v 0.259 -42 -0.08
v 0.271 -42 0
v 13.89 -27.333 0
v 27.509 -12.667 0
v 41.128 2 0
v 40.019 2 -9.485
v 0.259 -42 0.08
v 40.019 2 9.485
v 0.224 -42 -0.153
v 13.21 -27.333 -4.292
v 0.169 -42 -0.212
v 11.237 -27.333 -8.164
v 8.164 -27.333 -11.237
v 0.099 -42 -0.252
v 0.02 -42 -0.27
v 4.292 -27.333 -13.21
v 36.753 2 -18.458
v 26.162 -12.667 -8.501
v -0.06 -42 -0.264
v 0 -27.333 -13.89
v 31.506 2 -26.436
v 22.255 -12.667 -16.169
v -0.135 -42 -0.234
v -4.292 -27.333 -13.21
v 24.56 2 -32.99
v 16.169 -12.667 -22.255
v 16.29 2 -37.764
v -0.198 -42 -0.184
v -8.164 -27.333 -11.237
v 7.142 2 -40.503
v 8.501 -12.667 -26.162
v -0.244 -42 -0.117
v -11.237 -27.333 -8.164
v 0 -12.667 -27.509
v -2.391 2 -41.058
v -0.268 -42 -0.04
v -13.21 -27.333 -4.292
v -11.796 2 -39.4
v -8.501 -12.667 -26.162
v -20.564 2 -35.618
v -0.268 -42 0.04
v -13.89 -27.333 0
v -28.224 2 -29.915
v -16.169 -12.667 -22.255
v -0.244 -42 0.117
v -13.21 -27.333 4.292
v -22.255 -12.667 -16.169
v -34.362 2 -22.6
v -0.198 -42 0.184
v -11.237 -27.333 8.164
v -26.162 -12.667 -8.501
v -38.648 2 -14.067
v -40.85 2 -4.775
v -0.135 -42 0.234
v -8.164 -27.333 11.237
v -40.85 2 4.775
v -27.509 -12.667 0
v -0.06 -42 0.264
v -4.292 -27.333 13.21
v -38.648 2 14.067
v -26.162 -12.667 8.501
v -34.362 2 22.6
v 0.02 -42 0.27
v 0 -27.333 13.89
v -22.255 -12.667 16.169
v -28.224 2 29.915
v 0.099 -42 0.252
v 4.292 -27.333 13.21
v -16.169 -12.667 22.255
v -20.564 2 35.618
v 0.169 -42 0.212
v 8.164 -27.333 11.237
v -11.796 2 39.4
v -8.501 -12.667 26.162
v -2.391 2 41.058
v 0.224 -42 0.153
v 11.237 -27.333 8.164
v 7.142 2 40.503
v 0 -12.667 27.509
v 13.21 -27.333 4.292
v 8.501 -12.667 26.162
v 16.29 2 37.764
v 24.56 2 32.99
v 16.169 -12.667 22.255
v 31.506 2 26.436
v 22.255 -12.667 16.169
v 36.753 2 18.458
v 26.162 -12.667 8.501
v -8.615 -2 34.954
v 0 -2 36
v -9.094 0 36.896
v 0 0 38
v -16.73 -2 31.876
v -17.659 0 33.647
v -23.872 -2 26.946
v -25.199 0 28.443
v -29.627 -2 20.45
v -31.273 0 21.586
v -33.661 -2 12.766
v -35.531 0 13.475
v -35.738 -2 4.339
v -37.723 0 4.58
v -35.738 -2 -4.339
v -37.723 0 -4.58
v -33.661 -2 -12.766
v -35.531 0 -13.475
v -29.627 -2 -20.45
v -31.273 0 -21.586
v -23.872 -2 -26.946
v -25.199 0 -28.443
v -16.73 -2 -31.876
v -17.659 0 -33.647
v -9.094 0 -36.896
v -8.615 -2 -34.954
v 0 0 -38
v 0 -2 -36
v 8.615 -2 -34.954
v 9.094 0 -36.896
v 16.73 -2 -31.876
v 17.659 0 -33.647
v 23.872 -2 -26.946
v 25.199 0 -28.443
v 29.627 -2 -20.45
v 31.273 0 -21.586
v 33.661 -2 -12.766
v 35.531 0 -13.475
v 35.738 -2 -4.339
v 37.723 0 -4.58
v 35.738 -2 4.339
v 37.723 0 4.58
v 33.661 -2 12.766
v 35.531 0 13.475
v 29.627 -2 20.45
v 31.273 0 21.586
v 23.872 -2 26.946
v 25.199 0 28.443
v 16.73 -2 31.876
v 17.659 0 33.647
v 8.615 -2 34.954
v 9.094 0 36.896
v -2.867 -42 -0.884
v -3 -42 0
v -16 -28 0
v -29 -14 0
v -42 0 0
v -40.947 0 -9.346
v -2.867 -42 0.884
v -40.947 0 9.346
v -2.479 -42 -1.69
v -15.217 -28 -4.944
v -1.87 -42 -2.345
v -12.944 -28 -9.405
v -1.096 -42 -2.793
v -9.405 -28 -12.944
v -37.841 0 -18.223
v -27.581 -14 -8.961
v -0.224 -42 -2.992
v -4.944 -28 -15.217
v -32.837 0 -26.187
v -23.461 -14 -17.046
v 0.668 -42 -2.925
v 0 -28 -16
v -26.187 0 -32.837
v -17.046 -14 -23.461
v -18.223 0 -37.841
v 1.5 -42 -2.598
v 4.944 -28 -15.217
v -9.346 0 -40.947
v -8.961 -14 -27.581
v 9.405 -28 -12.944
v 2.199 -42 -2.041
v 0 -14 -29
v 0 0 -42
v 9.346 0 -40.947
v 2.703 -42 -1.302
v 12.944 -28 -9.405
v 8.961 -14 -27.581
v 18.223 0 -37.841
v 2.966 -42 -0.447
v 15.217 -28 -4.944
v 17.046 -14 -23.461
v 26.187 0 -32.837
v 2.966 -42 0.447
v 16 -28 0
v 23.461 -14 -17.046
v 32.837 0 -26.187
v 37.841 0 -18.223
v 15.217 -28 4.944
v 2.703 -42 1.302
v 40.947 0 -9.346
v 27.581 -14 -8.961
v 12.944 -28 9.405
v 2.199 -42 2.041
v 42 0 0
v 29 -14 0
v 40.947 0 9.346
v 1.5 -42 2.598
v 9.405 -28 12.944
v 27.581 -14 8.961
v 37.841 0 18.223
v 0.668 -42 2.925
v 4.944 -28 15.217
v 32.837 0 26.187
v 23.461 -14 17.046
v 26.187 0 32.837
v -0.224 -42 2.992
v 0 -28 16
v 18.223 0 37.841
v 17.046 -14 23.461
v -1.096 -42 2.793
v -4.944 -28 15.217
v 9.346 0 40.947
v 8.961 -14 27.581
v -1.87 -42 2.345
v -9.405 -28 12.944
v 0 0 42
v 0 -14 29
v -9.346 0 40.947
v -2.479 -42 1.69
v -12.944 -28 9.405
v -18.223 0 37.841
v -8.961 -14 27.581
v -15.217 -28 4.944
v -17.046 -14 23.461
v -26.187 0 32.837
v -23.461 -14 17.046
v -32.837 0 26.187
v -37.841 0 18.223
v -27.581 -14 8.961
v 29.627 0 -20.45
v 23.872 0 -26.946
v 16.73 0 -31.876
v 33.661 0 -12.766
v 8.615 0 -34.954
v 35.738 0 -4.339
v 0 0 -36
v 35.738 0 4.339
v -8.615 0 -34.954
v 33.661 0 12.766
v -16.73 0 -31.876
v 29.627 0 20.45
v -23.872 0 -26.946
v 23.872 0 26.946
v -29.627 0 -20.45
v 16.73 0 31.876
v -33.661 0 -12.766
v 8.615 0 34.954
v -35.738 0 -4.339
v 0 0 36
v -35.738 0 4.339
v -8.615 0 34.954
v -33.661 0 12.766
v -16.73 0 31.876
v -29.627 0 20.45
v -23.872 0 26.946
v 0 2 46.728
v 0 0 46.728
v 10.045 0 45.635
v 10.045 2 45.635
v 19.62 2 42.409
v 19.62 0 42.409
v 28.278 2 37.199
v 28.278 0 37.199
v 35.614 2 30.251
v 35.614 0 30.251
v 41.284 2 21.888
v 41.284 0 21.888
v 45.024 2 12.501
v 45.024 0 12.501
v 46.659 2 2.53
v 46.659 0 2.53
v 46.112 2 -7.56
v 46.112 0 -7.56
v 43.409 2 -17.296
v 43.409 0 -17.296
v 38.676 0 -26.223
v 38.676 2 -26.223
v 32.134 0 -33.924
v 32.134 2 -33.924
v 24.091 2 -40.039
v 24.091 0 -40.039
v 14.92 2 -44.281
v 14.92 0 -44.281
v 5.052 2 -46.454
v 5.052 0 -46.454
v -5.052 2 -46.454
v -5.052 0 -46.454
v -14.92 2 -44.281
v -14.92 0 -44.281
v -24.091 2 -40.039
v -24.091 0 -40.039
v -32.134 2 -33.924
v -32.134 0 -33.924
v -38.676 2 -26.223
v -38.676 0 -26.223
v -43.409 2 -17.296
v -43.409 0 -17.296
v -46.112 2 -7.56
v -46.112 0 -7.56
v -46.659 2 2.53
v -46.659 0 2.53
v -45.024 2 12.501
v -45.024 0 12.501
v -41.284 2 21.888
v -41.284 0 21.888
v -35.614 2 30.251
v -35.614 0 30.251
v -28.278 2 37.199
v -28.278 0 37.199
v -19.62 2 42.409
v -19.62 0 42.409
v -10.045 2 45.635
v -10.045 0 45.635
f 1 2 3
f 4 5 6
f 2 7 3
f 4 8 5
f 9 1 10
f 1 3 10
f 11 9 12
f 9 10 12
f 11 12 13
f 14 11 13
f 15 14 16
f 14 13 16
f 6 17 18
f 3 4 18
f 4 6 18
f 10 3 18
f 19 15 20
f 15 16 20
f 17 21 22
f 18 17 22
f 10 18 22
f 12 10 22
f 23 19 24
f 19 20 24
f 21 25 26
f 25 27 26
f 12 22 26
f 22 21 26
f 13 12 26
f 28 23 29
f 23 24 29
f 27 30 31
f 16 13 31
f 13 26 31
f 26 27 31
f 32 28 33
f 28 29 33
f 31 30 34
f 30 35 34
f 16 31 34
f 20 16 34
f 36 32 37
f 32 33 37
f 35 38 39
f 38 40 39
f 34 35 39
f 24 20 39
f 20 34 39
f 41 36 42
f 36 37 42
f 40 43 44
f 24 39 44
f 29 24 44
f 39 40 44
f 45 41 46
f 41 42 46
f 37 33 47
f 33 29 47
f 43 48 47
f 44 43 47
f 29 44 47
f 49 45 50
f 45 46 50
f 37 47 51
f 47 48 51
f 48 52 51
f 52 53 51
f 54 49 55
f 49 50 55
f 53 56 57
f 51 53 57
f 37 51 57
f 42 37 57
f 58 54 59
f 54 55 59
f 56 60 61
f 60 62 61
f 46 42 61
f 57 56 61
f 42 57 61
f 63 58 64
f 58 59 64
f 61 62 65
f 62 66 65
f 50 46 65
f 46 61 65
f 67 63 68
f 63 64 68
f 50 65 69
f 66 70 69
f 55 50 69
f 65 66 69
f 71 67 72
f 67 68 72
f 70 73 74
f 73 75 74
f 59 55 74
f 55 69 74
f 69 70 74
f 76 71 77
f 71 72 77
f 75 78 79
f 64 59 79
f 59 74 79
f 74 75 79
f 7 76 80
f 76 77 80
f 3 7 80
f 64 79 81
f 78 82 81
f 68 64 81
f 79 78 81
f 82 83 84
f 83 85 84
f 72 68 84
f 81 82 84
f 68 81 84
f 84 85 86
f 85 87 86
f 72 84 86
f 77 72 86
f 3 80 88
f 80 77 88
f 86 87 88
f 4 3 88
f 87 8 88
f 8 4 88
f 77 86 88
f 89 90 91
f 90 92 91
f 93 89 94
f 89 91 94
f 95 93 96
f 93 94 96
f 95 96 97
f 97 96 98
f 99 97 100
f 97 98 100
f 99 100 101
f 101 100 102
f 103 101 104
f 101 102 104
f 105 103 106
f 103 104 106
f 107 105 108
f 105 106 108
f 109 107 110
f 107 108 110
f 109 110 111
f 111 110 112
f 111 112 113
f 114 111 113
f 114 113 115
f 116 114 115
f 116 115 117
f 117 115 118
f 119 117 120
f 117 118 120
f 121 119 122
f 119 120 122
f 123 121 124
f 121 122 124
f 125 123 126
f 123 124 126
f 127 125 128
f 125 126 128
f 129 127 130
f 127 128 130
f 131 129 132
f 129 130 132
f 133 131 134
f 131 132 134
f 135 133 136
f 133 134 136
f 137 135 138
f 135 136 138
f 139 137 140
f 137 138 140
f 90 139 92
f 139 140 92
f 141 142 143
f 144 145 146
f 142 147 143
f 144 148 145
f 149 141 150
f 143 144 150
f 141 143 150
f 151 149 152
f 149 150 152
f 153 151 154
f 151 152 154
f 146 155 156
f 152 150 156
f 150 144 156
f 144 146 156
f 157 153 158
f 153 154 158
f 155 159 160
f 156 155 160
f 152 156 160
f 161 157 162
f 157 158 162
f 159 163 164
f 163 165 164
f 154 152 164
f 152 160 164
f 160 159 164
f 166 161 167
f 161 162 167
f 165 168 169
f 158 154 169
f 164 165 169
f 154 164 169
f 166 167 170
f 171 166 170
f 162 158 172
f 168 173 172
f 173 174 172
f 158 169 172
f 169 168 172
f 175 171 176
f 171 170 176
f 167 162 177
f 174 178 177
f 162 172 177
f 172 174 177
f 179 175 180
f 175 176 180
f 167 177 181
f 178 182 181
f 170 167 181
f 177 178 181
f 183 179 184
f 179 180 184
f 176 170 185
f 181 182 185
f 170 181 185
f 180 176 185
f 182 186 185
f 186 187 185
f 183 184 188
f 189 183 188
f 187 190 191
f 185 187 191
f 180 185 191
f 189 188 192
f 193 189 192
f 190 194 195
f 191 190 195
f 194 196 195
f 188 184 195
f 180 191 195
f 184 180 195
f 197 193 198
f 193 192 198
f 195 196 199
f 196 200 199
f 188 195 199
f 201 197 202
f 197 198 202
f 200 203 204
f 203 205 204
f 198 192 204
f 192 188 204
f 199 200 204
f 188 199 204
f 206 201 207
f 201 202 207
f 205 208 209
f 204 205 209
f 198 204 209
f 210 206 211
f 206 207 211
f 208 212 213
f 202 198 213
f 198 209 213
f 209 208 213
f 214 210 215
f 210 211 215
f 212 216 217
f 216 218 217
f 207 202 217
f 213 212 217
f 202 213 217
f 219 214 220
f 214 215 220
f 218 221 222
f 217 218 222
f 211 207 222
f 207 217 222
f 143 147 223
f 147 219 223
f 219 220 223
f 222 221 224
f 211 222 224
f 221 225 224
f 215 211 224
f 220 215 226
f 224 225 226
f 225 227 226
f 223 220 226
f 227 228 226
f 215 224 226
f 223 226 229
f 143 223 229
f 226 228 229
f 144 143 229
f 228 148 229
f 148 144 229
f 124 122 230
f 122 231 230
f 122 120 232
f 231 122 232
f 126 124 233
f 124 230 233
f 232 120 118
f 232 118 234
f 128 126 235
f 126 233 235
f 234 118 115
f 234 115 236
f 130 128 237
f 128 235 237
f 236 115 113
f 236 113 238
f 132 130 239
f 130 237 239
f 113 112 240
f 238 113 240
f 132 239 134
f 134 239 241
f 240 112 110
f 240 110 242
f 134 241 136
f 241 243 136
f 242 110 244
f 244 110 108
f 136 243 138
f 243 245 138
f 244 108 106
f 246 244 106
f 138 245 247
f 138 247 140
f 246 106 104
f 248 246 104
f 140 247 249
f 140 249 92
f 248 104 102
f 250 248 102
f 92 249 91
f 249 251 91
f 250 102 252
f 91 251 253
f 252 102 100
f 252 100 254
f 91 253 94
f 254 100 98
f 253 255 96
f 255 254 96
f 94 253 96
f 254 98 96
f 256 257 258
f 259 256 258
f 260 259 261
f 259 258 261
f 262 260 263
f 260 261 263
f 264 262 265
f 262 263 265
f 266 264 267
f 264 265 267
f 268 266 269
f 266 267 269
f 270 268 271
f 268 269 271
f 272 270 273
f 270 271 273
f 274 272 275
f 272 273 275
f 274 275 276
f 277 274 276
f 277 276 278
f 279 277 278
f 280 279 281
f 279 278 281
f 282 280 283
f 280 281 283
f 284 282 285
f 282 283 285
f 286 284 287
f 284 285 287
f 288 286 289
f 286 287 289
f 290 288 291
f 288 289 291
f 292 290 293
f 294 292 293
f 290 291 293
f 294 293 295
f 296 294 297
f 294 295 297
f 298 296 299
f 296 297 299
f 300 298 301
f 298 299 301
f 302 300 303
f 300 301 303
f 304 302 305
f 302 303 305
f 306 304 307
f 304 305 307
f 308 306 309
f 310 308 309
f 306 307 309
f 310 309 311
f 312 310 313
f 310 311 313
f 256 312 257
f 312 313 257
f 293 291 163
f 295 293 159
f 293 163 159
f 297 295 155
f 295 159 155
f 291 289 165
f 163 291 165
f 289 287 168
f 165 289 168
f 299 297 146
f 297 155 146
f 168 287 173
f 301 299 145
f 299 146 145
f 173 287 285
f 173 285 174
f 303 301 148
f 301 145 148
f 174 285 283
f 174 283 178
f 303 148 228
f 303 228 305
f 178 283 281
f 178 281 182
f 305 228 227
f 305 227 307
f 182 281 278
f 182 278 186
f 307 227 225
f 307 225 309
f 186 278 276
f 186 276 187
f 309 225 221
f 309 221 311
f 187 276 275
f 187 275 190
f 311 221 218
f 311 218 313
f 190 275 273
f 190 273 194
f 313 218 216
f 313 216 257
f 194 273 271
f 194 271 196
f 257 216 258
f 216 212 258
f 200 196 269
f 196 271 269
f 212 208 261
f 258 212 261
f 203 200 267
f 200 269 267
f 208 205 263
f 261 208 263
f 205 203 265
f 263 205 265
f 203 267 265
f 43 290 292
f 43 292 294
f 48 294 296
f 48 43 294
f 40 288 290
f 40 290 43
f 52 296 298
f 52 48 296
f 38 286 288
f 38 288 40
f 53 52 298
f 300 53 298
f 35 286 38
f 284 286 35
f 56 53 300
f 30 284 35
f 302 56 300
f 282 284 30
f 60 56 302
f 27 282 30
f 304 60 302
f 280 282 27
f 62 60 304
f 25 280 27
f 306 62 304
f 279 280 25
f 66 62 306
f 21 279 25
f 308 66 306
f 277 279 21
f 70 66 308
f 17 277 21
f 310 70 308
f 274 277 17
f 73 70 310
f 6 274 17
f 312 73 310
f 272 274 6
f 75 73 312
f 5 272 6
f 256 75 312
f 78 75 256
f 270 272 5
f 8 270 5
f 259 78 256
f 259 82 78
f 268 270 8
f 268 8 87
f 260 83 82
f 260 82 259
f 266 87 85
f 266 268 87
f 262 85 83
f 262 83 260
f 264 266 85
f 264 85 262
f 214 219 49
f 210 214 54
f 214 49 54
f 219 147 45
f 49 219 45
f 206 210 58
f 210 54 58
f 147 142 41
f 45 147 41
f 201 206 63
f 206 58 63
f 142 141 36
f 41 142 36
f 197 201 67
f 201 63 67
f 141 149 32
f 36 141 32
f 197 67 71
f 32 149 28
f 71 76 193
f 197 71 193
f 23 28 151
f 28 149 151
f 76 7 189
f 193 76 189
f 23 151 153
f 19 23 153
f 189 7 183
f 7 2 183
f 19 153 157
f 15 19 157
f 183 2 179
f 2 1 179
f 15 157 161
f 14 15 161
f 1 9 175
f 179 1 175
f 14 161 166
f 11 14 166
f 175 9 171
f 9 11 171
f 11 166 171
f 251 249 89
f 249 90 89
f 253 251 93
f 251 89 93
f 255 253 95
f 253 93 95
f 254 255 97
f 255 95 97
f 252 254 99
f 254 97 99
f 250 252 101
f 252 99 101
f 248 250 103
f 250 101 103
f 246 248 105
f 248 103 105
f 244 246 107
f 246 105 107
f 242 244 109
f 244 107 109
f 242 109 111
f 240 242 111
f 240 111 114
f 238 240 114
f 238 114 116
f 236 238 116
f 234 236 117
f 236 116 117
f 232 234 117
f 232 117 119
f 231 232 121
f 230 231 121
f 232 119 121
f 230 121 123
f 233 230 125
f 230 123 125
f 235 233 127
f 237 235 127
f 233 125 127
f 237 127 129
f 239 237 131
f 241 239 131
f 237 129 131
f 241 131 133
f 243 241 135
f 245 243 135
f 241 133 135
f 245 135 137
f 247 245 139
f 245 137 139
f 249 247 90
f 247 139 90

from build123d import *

# Parameters (mm, degrees)
SKETCH1_R           = 46.7275
BOSS_EXTRUDE2_DEPTH = 2


# Read off the part's stored shape, not the designer's step: Shell1
with BuildPart() as part:
    # Sketch2 → Revolve1 (revolve)
    with BuildSketch(Plane.XY):
        Polygon((0, 0), (0, -42), (-3, -42), (-42, 0), align=None)
    revolve(axis=Axis((0, 0, 0), (0, -1, 0)))

    # Sketch1 → Boss-Extrude2 (add)
    with BuildSketch(Plane(origin=(0, 0, 0), x_dir=(1, 0, 0), z_dir=(0, 1, 0))):
        with Locations(Location((0, 0, 0), (0, 0, 270))):
            Circle(SKETCH1_R)
    extrude(amount=BOSS_EXTRUDE2_DEPTH)

    # Shell1 outline → Shell1 (revolve, cut)
    with BuildSketch(Plane.XY):
        Polygon((41.127860975, 2), (0, 2), (0, -42), (0.270718118, -42), align=None)
    revolve(axis=Axis((0, 0, 0), (0, 1, 0)), mode=Mode.SUBTRACT)


with BuildPart() as body_2:
    # Sketch3 → Revolve2 (revolve)
    with BuildSketch(Plane(origin=(0, 0, 0), x_dir=(0, 0, -1), z_dir=(1, 0, 0))):
        Polygon((-38, 0), (-36, 0), (-36, -2), align=None)
    revolve(axis=Axis((0, 0, 0), (0, -1, 0)))


solid = Compound([part.part, body_2.part])
